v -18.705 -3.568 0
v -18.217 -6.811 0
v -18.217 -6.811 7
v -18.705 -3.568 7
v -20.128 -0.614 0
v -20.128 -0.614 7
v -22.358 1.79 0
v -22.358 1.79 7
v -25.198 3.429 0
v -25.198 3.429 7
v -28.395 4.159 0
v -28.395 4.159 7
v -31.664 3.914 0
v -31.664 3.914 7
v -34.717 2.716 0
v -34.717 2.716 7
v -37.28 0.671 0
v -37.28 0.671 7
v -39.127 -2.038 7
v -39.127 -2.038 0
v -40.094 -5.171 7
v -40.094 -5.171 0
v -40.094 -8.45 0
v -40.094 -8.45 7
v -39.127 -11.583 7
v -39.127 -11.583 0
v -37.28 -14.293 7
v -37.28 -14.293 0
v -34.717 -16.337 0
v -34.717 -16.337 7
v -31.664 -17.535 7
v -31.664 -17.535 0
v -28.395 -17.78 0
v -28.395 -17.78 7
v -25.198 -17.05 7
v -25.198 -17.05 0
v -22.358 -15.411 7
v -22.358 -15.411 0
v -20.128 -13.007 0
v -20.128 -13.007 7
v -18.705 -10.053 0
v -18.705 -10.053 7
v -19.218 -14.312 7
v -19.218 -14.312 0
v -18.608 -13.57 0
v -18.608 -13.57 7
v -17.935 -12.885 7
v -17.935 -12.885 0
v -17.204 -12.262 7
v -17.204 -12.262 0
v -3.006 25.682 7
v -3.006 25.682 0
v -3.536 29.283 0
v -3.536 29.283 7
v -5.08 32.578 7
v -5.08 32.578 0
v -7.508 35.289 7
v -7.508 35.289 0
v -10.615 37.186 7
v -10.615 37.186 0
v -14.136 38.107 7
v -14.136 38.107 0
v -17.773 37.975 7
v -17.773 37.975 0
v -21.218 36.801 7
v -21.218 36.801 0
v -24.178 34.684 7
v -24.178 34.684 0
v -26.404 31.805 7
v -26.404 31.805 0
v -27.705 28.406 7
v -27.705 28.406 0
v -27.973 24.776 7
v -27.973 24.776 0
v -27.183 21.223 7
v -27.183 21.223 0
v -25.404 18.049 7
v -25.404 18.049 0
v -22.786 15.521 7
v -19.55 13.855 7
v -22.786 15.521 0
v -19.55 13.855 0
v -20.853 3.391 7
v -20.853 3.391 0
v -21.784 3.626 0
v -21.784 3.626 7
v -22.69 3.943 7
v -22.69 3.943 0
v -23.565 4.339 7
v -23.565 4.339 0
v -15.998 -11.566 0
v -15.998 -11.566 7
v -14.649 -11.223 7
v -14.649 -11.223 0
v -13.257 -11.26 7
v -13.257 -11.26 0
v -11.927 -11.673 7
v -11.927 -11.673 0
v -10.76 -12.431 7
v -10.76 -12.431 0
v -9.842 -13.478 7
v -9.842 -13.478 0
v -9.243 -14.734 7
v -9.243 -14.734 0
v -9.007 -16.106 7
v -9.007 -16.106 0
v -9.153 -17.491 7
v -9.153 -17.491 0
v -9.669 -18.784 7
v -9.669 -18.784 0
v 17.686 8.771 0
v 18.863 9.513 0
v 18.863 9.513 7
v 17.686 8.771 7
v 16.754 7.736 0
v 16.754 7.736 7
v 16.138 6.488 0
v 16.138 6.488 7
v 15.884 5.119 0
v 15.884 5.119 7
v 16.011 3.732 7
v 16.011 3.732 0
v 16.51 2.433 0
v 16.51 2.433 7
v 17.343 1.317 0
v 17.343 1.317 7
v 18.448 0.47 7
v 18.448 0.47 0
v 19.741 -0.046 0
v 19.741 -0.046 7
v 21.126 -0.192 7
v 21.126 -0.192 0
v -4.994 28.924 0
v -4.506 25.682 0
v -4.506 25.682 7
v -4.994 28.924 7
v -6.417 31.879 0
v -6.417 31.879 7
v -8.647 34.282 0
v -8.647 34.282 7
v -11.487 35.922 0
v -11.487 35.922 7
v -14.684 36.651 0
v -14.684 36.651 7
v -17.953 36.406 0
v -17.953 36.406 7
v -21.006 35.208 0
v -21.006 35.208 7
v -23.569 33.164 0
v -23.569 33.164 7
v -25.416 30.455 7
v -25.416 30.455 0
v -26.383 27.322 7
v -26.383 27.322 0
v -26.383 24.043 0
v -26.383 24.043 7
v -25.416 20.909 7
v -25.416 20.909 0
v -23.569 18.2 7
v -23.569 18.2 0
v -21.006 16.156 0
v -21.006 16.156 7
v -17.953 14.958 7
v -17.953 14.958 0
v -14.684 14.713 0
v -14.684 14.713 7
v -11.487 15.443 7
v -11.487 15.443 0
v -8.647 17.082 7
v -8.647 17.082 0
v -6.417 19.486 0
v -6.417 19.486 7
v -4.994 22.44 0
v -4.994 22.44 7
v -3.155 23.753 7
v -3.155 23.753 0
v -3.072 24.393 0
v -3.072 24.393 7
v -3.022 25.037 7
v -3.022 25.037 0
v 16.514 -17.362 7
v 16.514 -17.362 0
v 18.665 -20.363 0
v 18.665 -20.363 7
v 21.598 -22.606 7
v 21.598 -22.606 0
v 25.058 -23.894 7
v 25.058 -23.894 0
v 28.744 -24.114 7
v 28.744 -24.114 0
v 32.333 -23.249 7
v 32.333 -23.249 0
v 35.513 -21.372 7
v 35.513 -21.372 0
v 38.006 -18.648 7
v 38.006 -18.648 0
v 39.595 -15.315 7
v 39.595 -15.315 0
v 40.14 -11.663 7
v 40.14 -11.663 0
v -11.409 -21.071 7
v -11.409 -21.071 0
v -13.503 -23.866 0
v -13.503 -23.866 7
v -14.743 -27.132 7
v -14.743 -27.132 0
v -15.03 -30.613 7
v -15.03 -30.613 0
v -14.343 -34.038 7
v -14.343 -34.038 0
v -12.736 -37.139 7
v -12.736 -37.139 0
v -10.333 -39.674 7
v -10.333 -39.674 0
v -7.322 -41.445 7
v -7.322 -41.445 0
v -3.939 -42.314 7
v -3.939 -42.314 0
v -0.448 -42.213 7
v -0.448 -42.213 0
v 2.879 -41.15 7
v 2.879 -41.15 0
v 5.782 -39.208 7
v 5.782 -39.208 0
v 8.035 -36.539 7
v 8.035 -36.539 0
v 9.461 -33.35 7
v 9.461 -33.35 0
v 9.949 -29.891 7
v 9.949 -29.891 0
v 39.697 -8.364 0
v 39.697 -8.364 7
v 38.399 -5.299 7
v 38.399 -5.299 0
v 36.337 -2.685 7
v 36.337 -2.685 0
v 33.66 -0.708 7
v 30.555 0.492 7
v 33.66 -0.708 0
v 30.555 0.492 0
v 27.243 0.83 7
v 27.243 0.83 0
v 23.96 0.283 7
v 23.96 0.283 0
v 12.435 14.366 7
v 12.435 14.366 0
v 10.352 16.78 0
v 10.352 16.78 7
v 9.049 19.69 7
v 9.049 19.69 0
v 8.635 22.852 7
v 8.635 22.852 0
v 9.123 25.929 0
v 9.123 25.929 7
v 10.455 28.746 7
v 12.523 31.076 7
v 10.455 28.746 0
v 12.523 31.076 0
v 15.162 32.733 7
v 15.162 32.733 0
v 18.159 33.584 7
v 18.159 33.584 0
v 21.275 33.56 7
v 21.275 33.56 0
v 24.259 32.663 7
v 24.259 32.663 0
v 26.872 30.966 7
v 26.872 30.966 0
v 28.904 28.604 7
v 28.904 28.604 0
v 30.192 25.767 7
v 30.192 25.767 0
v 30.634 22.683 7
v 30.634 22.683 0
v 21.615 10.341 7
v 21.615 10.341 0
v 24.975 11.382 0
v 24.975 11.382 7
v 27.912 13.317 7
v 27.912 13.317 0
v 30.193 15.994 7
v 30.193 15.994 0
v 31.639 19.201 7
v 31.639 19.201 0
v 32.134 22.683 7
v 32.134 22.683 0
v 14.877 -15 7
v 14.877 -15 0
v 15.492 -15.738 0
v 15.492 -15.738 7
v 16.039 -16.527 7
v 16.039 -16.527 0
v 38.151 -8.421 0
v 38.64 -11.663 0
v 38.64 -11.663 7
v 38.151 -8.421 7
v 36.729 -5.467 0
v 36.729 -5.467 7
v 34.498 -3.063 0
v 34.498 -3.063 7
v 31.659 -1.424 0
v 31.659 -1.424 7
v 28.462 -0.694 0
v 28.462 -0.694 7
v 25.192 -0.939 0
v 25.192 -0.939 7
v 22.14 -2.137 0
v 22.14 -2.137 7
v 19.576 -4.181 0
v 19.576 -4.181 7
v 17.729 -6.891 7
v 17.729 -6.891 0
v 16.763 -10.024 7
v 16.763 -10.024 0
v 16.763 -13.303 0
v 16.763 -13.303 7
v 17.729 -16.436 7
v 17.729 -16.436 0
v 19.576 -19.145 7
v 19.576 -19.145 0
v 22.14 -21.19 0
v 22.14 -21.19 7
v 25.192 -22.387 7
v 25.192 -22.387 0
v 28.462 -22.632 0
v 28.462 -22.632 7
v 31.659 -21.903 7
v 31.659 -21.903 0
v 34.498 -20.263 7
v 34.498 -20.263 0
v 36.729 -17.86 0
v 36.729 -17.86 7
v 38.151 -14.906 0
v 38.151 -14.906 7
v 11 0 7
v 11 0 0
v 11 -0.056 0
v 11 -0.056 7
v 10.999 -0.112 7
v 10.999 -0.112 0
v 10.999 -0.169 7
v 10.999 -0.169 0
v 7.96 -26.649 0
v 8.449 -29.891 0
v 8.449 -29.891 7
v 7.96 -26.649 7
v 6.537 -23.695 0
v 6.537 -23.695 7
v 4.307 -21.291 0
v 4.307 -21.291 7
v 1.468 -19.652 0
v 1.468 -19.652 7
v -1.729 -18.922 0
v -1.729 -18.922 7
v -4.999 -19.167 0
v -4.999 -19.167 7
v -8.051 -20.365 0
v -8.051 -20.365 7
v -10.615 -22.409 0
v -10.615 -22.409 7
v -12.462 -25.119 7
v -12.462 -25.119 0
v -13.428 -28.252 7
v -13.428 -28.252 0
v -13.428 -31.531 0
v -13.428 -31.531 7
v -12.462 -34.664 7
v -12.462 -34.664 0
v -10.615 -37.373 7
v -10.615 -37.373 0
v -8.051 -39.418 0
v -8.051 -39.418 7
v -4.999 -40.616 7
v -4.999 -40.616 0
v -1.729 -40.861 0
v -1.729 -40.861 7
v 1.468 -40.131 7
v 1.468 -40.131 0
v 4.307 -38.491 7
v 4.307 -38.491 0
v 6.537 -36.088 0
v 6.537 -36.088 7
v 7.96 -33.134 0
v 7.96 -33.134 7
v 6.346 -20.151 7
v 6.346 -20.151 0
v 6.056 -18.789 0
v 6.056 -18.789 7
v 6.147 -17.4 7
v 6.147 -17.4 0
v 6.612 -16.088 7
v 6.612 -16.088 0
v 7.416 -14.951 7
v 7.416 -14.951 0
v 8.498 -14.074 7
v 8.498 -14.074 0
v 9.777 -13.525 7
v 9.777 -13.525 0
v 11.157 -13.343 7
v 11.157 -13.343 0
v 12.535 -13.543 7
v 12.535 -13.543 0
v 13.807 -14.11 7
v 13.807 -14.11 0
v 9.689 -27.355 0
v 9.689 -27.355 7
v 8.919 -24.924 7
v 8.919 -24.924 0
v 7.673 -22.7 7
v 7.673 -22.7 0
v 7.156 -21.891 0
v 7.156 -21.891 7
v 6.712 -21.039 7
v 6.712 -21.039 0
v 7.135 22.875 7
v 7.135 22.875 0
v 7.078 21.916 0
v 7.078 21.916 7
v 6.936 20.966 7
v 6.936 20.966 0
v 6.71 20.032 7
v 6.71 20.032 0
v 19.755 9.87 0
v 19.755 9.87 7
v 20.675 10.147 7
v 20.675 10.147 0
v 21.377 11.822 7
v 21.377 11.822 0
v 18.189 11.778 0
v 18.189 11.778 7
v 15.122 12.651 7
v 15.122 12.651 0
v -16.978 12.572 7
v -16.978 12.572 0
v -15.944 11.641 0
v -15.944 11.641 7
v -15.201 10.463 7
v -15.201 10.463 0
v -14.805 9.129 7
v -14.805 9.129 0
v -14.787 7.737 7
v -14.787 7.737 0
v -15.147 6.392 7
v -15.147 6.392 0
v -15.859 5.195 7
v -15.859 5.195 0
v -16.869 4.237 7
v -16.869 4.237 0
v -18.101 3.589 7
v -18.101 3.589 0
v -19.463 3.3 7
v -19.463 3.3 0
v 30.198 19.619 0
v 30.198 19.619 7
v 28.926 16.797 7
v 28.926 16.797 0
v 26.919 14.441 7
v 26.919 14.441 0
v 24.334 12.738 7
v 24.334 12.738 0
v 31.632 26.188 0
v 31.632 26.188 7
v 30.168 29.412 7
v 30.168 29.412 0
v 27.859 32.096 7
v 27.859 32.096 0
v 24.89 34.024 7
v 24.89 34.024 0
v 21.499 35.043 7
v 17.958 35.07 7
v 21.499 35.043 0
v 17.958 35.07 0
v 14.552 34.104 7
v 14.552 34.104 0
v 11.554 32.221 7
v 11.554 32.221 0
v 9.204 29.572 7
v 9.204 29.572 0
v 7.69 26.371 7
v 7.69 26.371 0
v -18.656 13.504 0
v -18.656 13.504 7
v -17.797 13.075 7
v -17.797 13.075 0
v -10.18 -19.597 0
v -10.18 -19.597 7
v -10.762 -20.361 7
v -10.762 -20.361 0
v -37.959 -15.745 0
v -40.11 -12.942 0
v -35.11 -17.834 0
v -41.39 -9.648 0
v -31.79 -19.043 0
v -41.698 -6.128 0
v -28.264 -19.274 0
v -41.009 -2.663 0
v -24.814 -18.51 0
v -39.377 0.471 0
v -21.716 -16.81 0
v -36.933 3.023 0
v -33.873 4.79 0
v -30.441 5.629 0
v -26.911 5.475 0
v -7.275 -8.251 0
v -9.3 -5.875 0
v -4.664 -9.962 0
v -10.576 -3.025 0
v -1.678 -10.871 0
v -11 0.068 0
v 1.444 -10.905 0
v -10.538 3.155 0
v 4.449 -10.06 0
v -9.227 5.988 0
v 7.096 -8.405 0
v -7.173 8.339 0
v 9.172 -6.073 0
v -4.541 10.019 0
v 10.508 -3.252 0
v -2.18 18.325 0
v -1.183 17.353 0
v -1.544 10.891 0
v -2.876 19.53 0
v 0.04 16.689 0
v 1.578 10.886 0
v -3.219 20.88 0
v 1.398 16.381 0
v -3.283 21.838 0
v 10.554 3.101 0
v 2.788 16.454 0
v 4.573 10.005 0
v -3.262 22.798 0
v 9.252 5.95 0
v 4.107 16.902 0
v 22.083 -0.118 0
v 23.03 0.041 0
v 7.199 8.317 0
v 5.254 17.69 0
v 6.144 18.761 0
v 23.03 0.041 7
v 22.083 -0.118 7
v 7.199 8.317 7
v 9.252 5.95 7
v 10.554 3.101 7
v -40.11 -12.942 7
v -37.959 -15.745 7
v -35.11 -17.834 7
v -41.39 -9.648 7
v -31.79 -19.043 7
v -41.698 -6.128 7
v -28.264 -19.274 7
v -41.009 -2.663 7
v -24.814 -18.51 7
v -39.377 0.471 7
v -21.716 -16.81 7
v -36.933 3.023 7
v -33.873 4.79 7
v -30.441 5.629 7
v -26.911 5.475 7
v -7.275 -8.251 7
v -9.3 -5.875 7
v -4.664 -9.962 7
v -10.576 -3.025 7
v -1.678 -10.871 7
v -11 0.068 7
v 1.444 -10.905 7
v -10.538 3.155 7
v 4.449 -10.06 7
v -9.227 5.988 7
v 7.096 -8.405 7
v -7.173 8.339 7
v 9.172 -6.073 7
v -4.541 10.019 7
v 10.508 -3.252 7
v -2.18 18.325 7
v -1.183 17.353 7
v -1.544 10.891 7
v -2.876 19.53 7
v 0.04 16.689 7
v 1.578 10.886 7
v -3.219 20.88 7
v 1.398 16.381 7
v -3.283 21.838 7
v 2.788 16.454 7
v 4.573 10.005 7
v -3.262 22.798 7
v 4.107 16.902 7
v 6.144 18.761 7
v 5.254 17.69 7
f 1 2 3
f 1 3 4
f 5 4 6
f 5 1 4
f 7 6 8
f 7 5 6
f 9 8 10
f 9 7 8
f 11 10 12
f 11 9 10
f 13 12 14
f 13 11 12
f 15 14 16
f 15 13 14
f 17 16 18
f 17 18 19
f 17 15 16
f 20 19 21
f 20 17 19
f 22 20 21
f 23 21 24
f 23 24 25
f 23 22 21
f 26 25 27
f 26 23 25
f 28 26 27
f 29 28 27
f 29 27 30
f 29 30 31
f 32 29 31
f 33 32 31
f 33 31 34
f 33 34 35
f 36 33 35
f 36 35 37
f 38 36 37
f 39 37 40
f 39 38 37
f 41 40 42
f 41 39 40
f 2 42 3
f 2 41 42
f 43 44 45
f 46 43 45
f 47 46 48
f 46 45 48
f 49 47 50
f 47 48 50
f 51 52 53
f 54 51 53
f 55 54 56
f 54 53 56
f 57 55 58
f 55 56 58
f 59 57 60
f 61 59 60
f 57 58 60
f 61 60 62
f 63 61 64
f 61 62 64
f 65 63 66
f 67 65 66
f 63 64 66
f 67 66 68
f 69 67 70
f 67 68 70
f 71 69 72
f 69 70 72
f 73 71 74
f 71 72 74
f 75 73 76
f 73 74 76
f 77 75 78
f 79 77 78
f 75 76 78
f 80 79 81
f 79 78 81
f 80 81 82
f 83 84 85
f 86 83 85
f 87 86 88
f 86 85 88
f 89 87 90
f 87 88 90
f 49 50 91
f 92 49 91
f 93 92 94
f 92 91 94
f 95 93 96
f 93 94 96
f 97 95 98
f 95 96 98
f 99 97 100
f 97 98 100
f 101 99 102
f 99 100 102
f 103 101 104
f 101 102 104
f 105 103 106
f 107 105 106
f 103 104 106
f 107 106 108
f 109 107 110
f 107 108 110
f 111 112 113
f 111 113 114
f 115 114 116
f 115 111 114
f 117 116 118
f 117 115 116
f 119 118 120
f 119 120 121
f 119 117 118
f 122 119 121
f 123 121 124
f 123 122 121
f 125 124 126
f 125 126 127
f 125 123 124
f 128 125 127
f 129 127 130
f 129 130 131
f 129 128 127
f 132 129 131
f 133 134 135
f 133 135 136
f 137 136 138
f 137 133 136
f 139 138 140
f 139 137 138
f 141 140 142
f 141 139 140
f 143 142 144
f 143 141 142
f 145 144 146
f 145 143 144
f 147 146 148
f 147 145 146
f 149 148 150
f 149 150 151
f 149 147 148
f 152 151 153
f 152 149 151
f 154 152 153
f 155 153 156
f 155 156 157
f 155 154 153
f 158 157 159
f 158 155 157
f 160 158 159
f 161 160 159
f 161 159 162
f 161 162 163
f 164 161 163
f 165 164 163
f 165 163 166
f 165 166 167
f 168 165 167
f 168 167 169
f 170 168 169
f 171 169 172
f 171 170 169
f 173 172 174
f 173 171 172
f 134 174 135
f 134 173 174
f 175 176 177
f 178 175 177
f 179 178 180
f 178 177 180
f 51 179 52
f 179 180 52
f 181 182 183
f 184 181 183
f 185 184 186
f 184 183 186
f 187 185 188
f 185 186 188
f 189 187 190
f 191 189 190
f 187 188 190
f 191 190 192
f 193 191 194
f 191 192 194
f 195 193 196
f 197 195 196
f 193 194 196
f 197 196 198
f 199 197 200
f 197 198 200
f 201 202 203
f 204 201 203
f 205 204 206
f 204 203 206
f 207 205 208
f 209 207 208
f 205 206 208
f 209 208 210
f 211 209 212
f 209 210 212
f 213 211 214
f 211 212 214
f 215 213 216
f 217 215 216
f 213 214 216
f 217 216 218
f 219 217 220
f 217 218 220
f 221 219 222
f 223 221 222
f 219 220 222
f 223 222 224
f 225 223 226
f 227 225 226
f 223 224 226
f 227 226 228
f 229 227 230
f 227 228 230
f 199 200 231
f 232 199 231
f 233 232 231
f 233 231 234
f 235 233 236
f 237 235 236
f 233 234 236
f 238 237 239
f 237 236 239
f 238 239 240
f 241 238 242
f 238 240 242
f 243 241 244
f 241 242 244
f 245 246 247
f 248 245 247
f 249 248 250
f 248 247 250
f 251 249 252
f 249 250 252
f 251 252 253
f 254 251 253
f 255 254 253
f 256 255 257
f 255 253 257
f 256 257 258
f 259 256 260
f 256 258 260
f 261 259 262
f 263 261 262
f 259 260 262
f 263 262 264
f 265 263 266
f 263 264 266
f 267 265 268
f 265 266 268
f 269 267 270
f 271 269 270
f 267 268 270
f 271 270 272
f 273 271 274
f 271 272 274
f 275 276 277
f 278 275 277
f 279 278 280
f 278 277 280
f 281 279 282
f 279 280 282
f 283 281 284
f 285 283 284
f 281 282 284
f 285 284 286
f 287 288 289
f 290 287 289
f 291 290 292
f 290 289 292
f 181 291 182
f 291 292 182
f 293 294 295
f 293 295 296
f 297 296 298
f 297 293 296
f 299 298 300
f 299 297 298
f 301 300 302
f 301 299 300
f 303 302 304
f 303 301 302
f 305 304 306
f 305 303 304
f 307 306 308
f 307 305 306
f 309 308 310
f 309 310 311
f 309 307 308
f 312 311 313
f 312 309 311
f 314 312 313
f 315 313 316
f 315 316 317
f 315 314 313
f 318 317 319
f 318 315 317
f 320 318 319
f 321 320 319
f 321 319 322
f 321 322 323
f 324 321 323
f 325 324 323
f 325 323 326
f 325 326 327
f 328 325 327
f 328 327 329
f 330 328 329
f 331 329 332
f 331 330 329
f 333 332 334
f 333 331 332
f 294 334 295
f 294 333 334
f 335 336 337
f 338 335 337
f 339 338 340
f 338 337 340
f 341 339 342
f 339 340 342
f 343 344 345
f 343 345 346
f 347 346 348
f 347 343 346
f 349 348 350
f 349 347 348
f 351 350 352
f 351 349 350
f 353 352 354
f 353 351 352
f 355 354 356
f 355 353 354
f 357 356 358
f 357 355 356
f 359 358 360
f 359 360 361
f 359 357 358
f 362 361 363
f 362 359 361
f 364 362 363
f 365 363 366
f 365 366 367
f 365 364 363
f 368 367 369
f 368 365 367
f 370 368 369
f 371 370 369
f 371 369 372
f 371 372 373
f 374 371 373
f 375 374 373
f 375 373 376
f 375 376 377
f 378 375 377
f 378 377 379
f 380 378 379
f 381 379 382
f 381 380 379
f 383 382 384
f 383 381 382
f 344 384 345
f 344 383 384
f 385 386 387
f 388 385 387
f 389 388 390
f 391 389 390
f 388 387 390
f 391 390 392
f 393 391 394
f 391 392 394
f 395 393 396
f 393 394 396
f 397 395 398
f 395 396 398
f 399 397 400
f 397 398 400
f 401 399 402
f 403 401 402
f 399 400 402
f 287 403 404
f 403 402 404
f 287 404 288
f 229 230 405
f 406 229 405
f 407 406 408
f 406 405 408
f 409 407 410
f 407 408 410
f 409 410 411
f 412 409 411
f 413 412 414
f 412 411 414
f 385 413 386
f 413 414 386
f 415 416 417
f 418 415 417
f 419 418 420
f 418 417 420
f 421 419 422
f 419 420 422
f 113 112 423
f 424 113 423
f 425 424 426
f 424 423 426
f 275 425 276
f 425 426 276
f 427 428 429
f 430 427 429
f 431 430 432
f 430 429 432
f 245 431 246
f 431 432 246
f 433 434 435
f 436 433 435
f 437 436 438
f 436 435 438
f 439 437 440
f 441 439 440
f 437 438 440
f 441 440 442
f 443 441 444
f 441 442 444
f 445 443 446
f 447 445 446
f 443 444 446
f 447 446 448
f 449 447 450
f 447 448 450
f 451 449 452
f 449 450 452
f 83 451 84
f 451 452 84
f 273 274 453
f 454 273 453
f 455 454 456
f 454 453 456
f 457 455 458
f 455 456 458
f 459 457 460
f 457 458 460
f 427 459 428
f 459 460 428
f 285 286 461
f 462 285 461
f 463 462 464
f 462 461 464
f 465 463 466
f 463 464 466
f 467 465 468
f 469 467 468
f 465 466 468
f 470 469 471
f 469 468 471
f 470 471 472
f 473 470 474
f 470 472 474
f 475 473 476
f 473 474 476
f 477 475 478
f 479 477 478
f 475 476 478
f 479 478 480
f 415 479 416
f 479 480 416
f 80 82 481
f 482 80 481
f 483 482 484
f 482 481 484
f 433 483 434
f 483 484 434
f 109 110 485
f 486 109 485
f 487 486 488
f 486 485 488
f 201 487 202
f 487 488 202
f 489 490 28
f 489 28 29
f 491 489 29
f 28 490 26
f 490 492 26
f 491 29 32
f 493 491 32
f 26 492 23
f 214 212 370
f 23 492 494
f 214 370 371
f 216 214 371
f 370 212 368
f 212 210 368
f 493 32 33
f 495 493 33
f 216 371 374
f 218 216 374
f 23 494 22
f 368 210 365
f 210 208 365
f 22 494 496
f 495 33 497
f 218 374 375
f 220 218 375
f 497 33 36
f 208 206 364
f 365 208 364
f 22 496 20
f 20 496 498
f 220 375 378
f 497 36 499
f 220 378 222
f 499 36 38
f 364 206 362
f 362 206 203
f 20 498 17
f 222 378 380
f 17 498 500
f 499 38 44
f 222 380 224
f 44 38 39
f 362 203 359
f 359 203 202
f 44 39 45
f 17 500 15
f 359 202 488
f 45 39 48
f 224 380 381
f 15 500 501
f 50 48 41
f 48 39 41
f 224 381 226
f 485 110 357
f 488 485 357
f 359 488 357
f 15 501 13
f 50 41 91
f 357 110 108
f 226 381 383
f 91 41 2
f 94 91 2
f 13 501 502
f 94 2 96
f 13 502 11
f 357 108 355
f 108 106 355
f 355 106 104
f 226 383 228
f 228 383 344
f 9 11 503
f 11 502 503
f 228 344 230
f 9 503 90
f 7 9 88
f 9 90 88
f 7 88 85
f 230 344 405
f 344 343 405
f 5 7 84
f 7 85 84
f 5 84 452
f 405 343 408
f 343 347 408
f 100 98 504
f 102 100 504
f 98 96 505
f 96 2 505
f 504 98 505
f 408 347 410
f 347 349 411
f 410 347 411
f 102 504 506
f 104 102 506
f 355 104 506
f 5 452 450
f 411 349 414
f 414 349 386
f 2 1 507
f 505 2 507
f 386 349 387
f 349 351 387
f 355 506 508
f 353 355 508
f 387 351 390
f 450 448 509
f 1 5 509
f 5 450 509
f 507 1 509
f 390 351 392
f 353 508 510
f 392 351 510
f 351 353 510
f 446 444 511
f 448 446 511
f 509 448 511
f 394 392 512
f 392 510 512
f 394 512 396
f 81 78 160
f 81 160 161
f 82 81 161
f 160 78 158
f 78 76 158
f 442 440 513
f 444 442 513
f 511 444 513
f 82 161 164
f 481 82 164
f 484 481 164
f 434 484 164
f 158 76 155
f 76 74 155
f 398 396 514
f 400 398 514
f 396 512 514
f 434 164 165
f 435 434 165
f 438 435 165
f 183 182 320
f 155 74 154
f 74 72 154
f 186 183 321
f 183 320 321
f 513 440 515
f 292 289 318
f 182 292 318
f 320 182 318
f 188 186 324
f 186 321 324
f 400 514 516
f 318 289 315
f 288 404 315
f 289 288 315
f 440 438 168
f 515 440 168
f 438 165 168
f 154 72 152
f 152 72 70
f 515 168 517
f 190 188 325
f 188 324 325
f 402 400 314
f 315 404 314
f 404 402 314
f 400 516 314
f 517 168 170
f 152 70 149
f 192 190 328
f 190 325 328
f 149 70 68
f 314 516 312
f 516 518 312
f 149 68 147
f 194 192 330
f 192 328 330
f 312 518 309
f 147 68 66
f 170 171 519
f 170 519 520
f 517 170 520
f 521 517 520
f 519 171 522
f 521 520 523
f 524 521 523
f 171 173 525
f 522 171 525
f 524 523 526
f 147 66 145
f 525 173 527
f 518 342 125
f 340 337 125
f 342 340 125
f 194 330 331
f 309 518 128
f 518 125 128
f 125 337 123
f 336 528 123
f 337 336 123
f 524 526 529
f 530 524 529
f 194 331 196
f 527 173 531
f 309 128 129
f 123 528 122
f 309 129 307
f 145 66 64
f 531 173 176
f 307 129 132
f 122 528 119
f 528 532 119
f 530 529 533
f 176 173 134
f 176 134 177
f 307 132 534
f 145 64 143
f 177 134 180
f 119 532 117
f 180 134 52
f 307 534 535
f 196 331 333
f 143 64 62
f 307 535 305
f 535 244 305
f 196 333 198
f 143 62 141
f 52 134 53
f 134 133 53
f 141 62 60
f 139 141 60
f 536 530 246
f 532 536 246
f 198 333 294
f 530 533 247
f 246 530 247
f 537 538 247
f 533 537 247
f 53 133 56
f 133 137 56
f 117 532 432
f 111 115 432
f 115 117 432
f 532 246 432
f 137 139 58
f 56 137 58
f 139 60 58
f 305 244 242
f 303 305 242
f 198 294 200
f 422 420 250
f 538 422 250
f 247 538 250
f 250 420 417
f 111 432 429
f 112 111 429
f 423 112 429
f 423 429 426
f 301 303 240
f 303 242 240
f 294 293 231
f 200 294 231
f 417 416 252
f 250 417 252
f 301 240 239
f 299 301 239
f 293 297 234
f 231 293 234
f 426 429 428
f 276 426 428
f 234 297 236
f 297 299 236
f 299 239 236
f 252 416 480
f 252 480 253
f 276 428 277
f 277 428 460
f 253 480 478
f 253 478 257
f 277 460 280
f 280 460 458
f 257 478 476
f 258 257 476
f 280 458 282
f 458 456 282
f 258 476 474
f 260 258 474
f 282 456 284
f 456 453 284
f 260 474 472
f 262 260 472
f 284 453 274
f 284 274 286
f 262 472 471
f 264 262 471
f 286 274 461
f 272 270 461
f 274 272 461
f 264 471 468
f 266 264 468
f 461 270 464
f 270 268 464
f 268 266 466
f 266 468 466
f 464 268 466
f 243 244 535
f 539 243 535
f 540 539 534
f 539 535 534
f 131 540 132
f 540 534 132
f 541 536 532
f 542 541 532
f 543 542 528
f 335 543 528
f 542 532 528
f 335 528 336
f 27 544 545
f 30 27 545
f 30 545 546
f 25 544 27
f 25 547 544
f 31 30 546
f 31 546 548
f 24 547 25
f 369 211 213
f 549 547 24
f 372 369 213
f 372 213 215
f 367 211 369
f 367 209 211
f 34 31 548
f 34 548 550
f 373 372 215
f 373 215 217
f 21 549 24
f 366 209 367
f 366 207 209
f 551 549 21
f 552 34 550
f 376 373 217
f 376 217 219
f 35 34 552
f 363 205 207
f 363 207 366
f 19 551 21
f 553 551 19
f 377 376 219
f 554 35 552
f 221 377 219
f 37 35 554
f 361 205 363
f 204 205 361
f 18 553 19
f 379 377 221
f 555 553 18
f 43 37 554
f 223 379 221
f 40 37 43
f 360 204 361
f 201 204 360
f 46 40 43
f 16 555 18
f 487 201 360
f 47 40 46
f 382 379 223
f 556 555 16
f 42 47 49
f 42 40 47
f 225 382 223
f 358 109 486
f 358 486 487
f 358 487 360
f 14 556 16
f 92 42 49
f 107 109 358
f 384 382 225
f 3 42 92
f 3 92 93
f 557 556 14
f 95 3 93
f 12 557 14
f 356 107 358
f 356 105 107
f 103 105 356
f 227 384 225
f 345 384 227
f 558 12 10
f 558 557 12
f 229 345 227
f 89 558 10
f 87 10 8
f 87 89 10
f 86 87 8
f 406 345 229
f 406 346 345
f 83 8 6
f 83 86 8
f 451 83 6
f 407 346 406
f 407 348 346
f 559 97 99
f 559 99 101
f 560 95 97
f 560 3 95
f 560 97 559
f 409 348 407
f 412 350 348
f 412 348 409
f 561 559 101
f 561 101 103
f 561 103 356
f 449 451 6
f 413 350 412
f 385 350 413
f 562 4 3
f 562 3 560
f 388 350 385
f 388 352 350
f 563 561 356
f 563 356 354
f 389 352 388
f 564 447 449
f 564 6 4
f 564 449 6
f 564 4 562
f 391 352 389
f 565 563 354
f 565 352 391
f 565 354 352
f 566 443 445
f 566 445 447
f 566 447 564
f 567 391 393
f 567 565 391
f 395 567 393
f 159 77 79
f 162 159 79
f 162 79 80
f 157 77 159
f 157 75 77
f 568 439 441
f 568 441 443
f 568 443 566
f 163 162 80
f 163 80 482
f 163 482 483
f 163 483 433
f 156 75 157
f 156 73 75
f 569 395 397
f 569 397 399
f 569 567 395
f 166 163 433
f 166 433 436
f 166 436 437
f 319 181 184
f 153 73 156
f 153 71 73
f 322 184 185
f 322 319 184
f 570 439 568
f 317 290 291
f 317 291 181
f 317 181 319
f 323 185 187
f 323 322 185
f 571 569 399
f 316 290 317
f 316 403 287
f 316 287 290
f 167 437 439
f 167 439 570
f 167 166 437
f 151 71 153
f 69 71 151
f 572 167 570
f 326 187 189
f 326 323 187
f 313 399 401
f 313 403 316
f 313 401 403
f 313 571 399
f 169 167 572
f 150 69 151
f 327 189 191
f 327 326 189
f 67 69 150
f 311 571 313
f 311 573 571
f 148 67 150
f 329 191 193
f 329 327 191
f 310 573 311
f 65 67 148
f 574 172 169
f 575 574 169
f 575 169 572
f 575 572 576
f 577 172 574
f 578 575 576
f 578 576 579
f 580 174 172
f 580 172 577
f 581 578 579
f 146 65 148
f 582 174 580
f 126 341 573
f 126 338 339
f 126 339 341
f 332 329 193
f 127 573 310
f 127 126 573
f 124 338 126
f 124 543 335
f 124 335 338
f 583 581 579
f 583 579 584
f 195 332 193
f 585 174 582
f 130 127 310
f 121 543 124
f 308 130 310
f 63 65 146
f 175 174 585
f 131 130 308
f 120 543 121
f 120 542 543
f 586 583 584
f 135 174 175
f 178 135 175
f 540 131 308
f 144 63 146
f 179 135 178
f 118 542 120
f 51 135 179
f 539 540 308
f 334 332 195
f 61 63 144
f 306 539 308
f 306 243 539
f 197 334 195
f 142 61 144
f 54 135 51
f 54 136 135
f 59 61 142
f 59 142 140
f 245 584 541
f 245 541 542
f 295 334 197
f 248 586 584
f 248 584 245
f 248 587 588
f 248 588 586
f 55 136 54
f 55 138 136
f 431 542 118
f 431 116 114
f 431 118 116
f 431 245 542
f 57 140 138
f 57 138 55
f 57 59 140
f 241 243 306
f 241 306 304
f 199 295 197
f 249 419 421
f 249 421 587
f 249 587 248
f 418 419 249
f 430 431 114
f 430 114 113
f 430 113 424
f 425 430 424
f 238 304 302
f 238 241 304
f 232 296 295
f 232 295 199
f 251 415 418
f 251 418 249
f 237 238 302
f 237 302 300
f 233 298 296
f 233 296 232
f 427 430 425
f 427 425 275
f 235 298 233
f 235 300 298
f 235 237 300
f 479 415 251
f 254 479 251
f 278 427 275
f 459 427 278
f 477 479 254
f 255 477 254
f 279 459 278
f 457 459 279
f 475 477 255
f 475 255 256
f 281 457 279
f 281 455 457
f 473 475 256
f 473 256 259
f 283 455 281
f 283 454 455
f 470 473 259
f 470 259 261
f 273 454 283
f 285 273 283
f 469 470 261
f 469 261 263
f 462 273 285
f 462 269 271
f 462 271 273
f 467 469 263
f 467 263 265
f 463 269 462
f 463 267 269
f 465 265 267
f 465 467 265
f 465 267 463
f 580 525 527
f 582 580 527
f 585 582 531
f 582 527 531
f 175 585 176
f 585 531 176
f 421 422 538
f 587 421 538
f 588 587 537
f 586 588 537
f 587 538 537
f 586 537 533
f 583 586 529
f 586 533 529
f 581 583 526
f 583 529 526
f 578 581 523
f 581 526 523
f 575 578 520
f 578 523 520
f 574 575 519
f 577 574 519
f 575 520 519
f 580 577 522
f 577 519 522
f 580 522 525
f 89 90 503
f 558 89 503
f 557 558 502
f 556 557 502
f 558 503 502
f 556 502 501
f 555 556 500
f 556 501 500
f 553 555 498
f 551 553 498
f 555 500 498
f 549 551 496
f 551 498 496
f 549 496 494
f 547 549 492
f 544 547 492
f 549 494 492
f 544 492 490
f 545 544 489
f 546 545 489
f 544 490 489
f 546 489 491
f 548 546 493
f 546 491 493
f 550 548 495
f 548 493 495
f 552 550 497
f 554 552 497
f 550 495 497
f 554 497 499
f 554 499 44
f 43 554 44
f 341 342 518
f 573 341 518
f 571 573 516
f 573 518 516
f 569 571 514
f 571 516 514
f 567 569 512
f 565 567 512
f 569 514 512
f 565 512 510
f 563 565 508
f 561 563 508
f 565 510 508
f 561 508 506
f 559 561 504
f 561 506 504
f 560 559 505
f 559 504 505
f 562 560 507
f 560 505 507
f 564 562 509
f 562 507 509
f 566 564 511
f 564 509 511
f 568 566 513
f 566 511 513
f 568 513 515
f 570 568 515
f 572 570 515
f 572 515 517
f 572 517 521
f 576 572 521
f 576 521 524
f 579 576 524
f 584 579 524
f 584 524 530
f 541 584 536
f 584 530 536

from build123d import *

# Parameters (mm, degrees)
F0_R        = 11
F1_DEPTH    = 7
F2_T1_DEPTH = 7


# Not quite as in the source:
# - a fillet or chamfer that OpenCascade refuses, or shapes differently, is made with other operations: its cross-section is extruded or revolved along the edge and cut away or added


with BuildPart() as f1:
    # F0 (on Top) → F1 (new body)
    with BuildSketch(Plane.XY):
        with BuildLine():
            ThreePointArc((-9.9988986959, 7.5014681809), (-6.4607179934, 10.7008935613), (-1.9816481289, 12.341923298))
            ThreePointArc((-1.9816481289, 12.341923298), (-0.3831736882, 12.7248418239), (1.1389923545, 13.3451302033))
            ThreePointArc((1.1389923545, 13.3451302033), (-2.4661233688, 17.9474854132), (-3.1554936593, 23.7529398707))
            ThreePointArc((-3.1554936593, 23.7529398707), (-9.0450051907, 14.9812509858), (-19.5502137573, 13.8545456359))
            ThreePointArc((-19.5502137573, 13.8545456359), (-14.7338220094, 10.5408010189), (-12.3400050466, 5.2071181257))
            ThreePointArc((-12.3400050466, 5.2071181257), (-11.0821926148, 6.2652556505), (-9.9988986959, 7.5014681809))
        make_face()
        with BuildLine():
            ThreePointArc((8.8575875126, -8.820042146), (11.5166580742, -4.8596899903), (12.4985313373, -0.1916100485))
            Line((12.4985313373, -0.1916100485), (10.9987075768, -0.1686168427))
            ThreePointArc((10.9987075768, -0.1686168427), (-10.0394748812, -4.4954359199), (7.1990009483, 8.3171140034))
            Line((7.1990009483, 8.3171140034), (8.1806828958, 9.451265913))
            ThreePointArc((8.1806828958, 9.451265913), (6.2269941558, 10.838567423), (4.0444905732, 11.8275989112))
            ThreePointArc((4.0444905732, 11.8275989112), (1.0629967692, 12.4547195018), (-1.9816481289, 12.341923298))
            ThreePointArc((-1.9816481289, 12.341923298), (-6.4607179934, 10.7008935613), (-9.9988986959, 7.5014681809))
            ThreePointArc((-9.9988986959, 7.5014681809), (-11.5166580742, 4.8596899903), (-12.3502295249, 1.9292046764))
            ThreePointArc((-12.3502295249, 1.9292046764), (-12.1736262075, -2.8377499821), (-10.2241498173, -7.1914366098))
            ThreePointArc((-10.2241498173, -7.1914366098), (-8.1806828958, -9.451265913), (-5.6512134863, -11.1496092367))
            ThreePointArc((-5.6512134863, -11.1496092367), (-1.0629967692, -12.4547195018), (3.6800266027, -11.9460204337))
            ThreePointArc((3.6800266027, -11.9460204337), (6.4607179934, -10.7008935613), (8.8575875126, -8.820042146))
        make_face()
        with BuildLine():
            ThreePointArc((-1.9816481289, 12.341923298), (1.0629967692, 12.4547195018), (4.0444905732, 11.8275989112))
            ThreePointArc((4.0444905732, 11.8275989112), (2.5340263598, 12.4758619713), (1.1389923545, 13.3451302033))
            ThreePointArc((1.1389923545, 13.3451302033), (-0.3831736882, 12.7248418239), (-1.9816481289, 12.341923298))
        make_face()
        with BuildLine():
            ThreePointArc((11.1255036275, 5.6985234083), (12.1515183278, 2.930972932), (12.5, 0))
            ThreePointArc((12.5, 0), (12.4996328289, -0.0958078385), (12.4985313373, -0.1916100485))
            ThreePointArc((12.4985313373, -0.1916100485), (12.6483070335, 1.4452510866), (13.0439410346, 3.0406259242))
            ThreePointArc((13.0439410346, 3.0406259242), (11.983636554, 4.2966122073), (11.1255036275, 5.6985234083))
        make_face()
        with BuildLine():
            ThreePointArc((12.4985313373, -0.1916100485), (12.4996328289, -0.0958078385), (12.5, 0))
            ThreePointArc((12.5, 0), (12.1515183278, 2.930972932), (11.1255036275, 5.6985234083))
            ThreePointArc((11.1255036275, 5.6985234083), (9.8337672636, 7.7166716533), (8.1806828958, 9.451265913))
            Line((8.1806828958, 9.451265913), (7.1990009483, 8.3171140034))
            ThreePointArc((7.1990009483, 8.3171140034), (10.0047241449, 4.5722527035), (11, 0))
            ThreePointArc((11, 0), (10.9996768895, -0.0843108979), (10.9987075768, -0.1686168427))
            Line((10.9987075768, -0.1686168427), (12.4985313373, -0.1916100485))
        make_face()
        with BuildLine():
            ThreePointArc((-12.3502295249, 1.9292046764), (-11.5166580742, 4.8596899903), (-9.9988986959, 7.5014681809))
            ThreePointArc((-9.9988986959, 7.5014681809), (-11.0821926148, 6.2652556505), (-12.3400050466, 5.2071181257))
            ThreePointArc((-12.3400050466, 5.2071181257), (-12.2204509169, 3.5677725413), (-12.3502295249, 1.9292046764))
        make_face()
        with BuildLine():
            ThreePointArc((-8.7655348947, -10.1269542181), (-9.3831980656, -8.603721031), (-10.2241498173, -7.1914366098))
            ThreePointArc((-10.2241498173, -7.1914366098), (-12.1736262075, -2.8377499821), (-12.3502295249, 1.9292046764))
            ThreePointArc((-12.3502295249, 1.9292046764), (-12.2204509169, 3.5677725413), (-12.3400050466, 5.2071181257))
            ThreePointArc((-12.3400050466, 5.2071181257), (-17.8311469845, 3.2006552991), (-23.5654894116, 4.3390092796))
            ThreePointArc((-23.5654894116, 4.3390092796), (-18.5656426554, -0.2680533802), (-16.7167028979, -6.8105999571))
            ThreePointArc((-16.7167028979, -6.8105999571), (-17.3584518949, -10.7643175938), (-19.217804202, -14.312068138))
            ThreePointArc((-19.217804202, -14.312068138), (-14.577898889, -10.7554107829), (-8.7655348947, -10.1269542181))
        make_face()
        with BuildLine():
            ThreePointArc((8.1806828958, 9.451265913), (9.8337672636, 7.7166716533), (11.1255036275, 5.6985234083))
            ThreePointArc((11.1255036275, 5.6985234083), (11.983636554, 4.2966122073), (13.0439410346, 3.0406259242))
            ThreePointArc((13.0439410346, 3.0406259242), (16.3069989221, 7.8915006988), (21.6152870788, 10.3411148932))
            ThreePointArc((21.6152870788, 10.3411148932), (16.2136999096, 10.6599763116), (11.4529560542, 13.2317722782))
            Line((11.4529560542, 13.2317722782), (8.1806828958, 9.451265913))
        make_face()
        with BuildLine():
            ThreePointArc((13.0439410346, 3.0406259242), (12.6483070335, 1.4452510866), (12.4985313373, -0.1916100485))
            ThreePointArc((12.4985313373, -0.1916100485), (11.5166580742, -4.8596899903), (8.8575875126, -8.820042146))
            ThreePointArc((8.8575875126, -8.820042146), (7.7894683874, -10.0693894433), (6.9226065521, -11.4659200351))
            ThreePointArc((6.9226065521, -11.4659200351), (12.5444029571, -13.0702697591), (16.5144757506, -17.3617793852))
            ThreePointArc((16.5144757506, -17.3617793852), (16.1233213039, -6.8035659865), (23.9599527753, 0.2827644569))
            ThreePointArc((23.9599527754, 0.2827644569), (18.115639784, 0.1326361285), (13.0439410346, 3.0406259242))
        make_face()
        with BuildLine():
            ThreePointArc((4.0444905732, 11.8275989112), (6.2269941558, 10.838567423), (8.1806828958, 9.451265913))
            Line((8.1806828958, 9.451265913), (11.4529560542, 13.2317722782))
            ThreePointArc((11.4529560542, 13.2317722782), (8.2251447668, 17.5745882822), (7.1351076127, 22.8746482397))
            ThreePointArc((7.1351076127, 22.8746482397), (5.471896103, 17.2699840812), (1.1389923545, 13.3451302033))
            ThreePointArc((1.1389923545, 13.3451302033), (2.5340263598, 12.4758619713), (4.0444905732, 11.8275989112))
        make_face()
        with BuildLine():
            ThreePointArc((6.9226065521, -11.4659200351), (7.7894683874, -10.0693894433), (8.8575875126, -8.820042146))
            ThreePointArc((8.8575875126, -8.820042146), (6.4607179934, -10.7008935613), (3.6800266027, -11.9460204337))
            ThreePointArc((3.6800266027, -11.9460204337), (5.2830572871, -11.5826476774), (6.9226065521, -11.4659200351))
        make_face()
        with BuildLine():
            ThreePointArc((-8.7655348947, -10.1269542181), (-7.1694803363, -10.5198371292), (-5.6512134863, -11.1496092367))
            ThreePointArc((-5.6512134863, -11.1496092367), (-8.1806828958, -9.451265913), (-10.2241498173, -7.1914366098))
            ThreePointArc((-10.2241498173, -7.1914366098), (-9.3831980656, -8.603721031), (-8.7655348947, -10.1269542181))
        make_face()
        with BuildLine():
            ThreePointArc((6.9226065521, -11.4659200351), (5.2830572871, -11.5826476774), (3.6800266027, -11.9460204337))
            ThreePointArc((3.6800266027, -11.9460204337), (-1.0629967692, -12.4547195018), (-5.6512134863, -11.1496092367))
            ThreePointArc((-5.6512134863, -11.1496092367), (-7.1694803363, -10.5198371292), (-8.7655348947, -10.1269542181))
            ThreePointArc((-8.7655348947, -10.1269542181), (-8.554131526, -15.969371652), (-11.4087797586, -21.0712846584))
            ThreePointArc((-11.4087797586, -21.0712846584), (-1.4881954768, -17.4366073025), (7.6729575713, -22.6998901945))
            ThreePointArc((7.6729575713, -22.6998901945), (5.7241850115, -17.1880104456), (6.9226065521, -11.4659200351))
        make_face()
        with BuildLine():
            ThreePointArc((40.139979378, -11.6632559768), (35.0645893835, -1.6071550293), (23.9599527753, 0.2827644569))
            ThreePointArc((23.9599527753, 0.2827644569), (16.1233213039, -6.8035659865), (16.5144757506, -17.3617793852))
            ThreePointArc((16.5144757506, -17.3617793852), (30.5709523101, -23.8147743047), (40.139979378, -11.6632559768))
        make_face()
        with Locations((27.639979378, -11.6632559768)):
            Circle(F0_R, mode=Mode.SUBTRACT)
        with BuildLine():
            ThreePointArc((9.948807754, -29.8913268043), (9.3662712575, -26.1198465059), (7.6729575713, -22.6998901945))
            ThreePointArc((7.6729575713, -22.6998901945), (-1.4881954768, -17.4366073025), (-11.4087797586, -21.0712846584))
            ThreePointArc((-11.4087797586, -21.0712846584), (-7.3224686, -41.4448943033), (9.948807754, -29.8913268043))
        make_face()
        with Locations((-2.551192246, -29.8913268043)):
            Circle(F0_R, mode=Mode.SUBTRACT)
        with BuildLine():
            ThreePointArc((-23.5654894116, 4.3390092796), (-41.3903291054, -9.6483499392), (-19.217804202, -14.312068138))
            ThreePointArc((-19.217804202, -14.312068138), (-17.3584518949, -10.7643175938), (-16.7167028979, -6.8105999571))
            ThreePointArc((-16.7167028979, -6.8105999571), (-18.5656426554, -0.2680533802), (-23.5654894116, 4.3390092796))
        make_face()
        with Locations((-29.2167028979, -6.8105999571)):
            Circle(F0_R, mode=Mode.SUBTRACT)
        with BuildLine():
            ThreePointArc((-19.5502137573, 13.8545456359), (-9.0450051907, 14.9812509858), (-3.1554936593, 23.7529398707))
            ThreePointArc((-3.1554936593, 23.7529398707), (-3.0432220495, 24.7146397824), (-3.0057231841, 25.6821445471))
            ThreePointArc((-3.0057231841, 25.6821445471), (-22.7753128505, 35.8508743637), (-19.5502137573, 13.8545456359))
        make_face()
        with Locations((-15.5057231841, 25.6821445471)):
            Circle(F0_R, mode=Mode.SUBTRACT)
        with BuildLine():
            Line((21.3774893034, 11.8221456889), (21.6152870788, 10.3411148932))
            ThreePointArc((21.6152870788, 10.3411148932), (29.1473291281, 14.5750360208), (32.13363895, 22.6830381912))
            ThreePointArc((32.13363895, 22.6830381912), (19.7294467885, 35.1826710201), (7.1351076127, 22.8746482397))
            Line((7.1351076127, 22.8746482397), (8.6349313732, 22.8516550339))
            ThreePointArc((8.6349313732, 22.8516550339), (19.7179498479, 33.6827150806), (30.63363895, 22.6830381912))
            ThreePointArc((30.63363895, 22.6830381912), (28.0056863067, 15.5479962813), (21.3774893034, 11.8221456889))
        make_face()
        with BuildLine():
            ThreePointArc((7.1351076127, 22.8746482397), (8.2251447668, 17.5745882822), (11.4529560542, 13.2317722782))
            Line((11.4529560542, 13.2317722782), (12.4346380016, 14.3659241877))
            ThreePointArc((12.4346380016, 14.3659241877), (9.5941640688, 18.1876022712), (8.6349313732, 22.8516550339))
            Line((8.6349313732, 22.8516550339), (7.1351076127, 22.8746482397))
        make_face()
        with BuildLine():
            Line((12.4346380016, 14.3659241877), (11.4529560542, 13.2317722782))
            ThreePointArc((11.4529560542, 13.2317722782), (16.2136999096, 10.6599763116), (21.6152870788, 10.3411148932))
            Line((21.6152870788, 10.3411148932), (21.3774893034, 11.8221456889))
            ThreePointArc((21.3774893034, 11.8221456889), (16.6240925945, 12.1027437371), (12.4346380016, 14.3659241877))
        make_face()
    extrude(amount=F1_DEPTH)

    # F2: fillet of radius 5.08 on 5 edges, made by hand

    # F2_s2 → F2_t1 (join)
    with BuildSketch(Plane.XY):
        with BuildLine():
            ThreePointArc((6.3459415764, -20.1508962512), (8.4975237439, -14.0744569275), (14.876798383, -15.0003487989))
            ThreePointArc((14.876798383, -15.0003487989), (11.2701865952, -12.3993640914), (6.9226065521, -11.4659200351))
            ThreePointArc((6.9226065521, -11.4659200351), (5.7239018226, -15.7479612549), (6.3459415764, -20.1508962512))
        make_face()
        with BuildLine():
            ThreePointArc((-17.2036373964, -12.2623184818), (-10.7597247272, -12.4308717062), (-9.6689959497, -18.7840387442))
            ThreePointArc((-9.6689959497, -18.7840387442), (-8.3098168293, -14.5501986249), (-8.7655348947, -10.1269542181))
            ThreePointArc((-8.7655348947, -10.1269542181), (-13.2084182325, -10.3101417816), (-17.2036373964, -12.2623184818))
        make_face()
        with BuildLine():
            ThreePointArc((-16.9783742176, 12.5723666486), (-15.147399335, 6.3917557032), (-20.852566517, 3.391174409))
            ThreePointArc((-20.852566517, 3.391174409), (-16.405935836, 3.4068467981), (-12.3400050466, 5.2071181257))
            ThreePointArc((-12.3400050466, 5.2071181257), (-13.8871532279, 9.3759432051), (-16.9783742176, 12.5723666486))
        make_face()
        with BuildLine():
            ThreePointArc((6.7104250563, 20.0324683896), (1.398117097, 16.3811939786), (-3.2185989105, 20.8798997907))
            ThreePointArc((-3.2185989105, 20.8798997907), (-1.8296091346, 16.6557457406), (1.1389923545, 13.3451302033))
            ThreePointArc((1.1389923545, 13.3451302033), (4.6256855307, 16.1047933589), (6.7104250563, 20.0324683896))
        make_face()
        with BuildLine():
            ThreePointArc((18.8633629941, 9.5133133434), (16.0114832212, 3.7323789519), (21.1256449813, -0.1916203052))
            ThreePointArc((21.1256449813, -0.1916203052), (16.7459841072, 0.5773664725), (13.0439410346, 3.0406259242))
            ThreePointArc((13.0439410346, 3.0406259242), (15.2751752047, 6.8869701775), (18.8633629941, 9.5133133434))
        make_face()
    extrude(amount=F2_T1_DEPTH)


solid = f1.part
